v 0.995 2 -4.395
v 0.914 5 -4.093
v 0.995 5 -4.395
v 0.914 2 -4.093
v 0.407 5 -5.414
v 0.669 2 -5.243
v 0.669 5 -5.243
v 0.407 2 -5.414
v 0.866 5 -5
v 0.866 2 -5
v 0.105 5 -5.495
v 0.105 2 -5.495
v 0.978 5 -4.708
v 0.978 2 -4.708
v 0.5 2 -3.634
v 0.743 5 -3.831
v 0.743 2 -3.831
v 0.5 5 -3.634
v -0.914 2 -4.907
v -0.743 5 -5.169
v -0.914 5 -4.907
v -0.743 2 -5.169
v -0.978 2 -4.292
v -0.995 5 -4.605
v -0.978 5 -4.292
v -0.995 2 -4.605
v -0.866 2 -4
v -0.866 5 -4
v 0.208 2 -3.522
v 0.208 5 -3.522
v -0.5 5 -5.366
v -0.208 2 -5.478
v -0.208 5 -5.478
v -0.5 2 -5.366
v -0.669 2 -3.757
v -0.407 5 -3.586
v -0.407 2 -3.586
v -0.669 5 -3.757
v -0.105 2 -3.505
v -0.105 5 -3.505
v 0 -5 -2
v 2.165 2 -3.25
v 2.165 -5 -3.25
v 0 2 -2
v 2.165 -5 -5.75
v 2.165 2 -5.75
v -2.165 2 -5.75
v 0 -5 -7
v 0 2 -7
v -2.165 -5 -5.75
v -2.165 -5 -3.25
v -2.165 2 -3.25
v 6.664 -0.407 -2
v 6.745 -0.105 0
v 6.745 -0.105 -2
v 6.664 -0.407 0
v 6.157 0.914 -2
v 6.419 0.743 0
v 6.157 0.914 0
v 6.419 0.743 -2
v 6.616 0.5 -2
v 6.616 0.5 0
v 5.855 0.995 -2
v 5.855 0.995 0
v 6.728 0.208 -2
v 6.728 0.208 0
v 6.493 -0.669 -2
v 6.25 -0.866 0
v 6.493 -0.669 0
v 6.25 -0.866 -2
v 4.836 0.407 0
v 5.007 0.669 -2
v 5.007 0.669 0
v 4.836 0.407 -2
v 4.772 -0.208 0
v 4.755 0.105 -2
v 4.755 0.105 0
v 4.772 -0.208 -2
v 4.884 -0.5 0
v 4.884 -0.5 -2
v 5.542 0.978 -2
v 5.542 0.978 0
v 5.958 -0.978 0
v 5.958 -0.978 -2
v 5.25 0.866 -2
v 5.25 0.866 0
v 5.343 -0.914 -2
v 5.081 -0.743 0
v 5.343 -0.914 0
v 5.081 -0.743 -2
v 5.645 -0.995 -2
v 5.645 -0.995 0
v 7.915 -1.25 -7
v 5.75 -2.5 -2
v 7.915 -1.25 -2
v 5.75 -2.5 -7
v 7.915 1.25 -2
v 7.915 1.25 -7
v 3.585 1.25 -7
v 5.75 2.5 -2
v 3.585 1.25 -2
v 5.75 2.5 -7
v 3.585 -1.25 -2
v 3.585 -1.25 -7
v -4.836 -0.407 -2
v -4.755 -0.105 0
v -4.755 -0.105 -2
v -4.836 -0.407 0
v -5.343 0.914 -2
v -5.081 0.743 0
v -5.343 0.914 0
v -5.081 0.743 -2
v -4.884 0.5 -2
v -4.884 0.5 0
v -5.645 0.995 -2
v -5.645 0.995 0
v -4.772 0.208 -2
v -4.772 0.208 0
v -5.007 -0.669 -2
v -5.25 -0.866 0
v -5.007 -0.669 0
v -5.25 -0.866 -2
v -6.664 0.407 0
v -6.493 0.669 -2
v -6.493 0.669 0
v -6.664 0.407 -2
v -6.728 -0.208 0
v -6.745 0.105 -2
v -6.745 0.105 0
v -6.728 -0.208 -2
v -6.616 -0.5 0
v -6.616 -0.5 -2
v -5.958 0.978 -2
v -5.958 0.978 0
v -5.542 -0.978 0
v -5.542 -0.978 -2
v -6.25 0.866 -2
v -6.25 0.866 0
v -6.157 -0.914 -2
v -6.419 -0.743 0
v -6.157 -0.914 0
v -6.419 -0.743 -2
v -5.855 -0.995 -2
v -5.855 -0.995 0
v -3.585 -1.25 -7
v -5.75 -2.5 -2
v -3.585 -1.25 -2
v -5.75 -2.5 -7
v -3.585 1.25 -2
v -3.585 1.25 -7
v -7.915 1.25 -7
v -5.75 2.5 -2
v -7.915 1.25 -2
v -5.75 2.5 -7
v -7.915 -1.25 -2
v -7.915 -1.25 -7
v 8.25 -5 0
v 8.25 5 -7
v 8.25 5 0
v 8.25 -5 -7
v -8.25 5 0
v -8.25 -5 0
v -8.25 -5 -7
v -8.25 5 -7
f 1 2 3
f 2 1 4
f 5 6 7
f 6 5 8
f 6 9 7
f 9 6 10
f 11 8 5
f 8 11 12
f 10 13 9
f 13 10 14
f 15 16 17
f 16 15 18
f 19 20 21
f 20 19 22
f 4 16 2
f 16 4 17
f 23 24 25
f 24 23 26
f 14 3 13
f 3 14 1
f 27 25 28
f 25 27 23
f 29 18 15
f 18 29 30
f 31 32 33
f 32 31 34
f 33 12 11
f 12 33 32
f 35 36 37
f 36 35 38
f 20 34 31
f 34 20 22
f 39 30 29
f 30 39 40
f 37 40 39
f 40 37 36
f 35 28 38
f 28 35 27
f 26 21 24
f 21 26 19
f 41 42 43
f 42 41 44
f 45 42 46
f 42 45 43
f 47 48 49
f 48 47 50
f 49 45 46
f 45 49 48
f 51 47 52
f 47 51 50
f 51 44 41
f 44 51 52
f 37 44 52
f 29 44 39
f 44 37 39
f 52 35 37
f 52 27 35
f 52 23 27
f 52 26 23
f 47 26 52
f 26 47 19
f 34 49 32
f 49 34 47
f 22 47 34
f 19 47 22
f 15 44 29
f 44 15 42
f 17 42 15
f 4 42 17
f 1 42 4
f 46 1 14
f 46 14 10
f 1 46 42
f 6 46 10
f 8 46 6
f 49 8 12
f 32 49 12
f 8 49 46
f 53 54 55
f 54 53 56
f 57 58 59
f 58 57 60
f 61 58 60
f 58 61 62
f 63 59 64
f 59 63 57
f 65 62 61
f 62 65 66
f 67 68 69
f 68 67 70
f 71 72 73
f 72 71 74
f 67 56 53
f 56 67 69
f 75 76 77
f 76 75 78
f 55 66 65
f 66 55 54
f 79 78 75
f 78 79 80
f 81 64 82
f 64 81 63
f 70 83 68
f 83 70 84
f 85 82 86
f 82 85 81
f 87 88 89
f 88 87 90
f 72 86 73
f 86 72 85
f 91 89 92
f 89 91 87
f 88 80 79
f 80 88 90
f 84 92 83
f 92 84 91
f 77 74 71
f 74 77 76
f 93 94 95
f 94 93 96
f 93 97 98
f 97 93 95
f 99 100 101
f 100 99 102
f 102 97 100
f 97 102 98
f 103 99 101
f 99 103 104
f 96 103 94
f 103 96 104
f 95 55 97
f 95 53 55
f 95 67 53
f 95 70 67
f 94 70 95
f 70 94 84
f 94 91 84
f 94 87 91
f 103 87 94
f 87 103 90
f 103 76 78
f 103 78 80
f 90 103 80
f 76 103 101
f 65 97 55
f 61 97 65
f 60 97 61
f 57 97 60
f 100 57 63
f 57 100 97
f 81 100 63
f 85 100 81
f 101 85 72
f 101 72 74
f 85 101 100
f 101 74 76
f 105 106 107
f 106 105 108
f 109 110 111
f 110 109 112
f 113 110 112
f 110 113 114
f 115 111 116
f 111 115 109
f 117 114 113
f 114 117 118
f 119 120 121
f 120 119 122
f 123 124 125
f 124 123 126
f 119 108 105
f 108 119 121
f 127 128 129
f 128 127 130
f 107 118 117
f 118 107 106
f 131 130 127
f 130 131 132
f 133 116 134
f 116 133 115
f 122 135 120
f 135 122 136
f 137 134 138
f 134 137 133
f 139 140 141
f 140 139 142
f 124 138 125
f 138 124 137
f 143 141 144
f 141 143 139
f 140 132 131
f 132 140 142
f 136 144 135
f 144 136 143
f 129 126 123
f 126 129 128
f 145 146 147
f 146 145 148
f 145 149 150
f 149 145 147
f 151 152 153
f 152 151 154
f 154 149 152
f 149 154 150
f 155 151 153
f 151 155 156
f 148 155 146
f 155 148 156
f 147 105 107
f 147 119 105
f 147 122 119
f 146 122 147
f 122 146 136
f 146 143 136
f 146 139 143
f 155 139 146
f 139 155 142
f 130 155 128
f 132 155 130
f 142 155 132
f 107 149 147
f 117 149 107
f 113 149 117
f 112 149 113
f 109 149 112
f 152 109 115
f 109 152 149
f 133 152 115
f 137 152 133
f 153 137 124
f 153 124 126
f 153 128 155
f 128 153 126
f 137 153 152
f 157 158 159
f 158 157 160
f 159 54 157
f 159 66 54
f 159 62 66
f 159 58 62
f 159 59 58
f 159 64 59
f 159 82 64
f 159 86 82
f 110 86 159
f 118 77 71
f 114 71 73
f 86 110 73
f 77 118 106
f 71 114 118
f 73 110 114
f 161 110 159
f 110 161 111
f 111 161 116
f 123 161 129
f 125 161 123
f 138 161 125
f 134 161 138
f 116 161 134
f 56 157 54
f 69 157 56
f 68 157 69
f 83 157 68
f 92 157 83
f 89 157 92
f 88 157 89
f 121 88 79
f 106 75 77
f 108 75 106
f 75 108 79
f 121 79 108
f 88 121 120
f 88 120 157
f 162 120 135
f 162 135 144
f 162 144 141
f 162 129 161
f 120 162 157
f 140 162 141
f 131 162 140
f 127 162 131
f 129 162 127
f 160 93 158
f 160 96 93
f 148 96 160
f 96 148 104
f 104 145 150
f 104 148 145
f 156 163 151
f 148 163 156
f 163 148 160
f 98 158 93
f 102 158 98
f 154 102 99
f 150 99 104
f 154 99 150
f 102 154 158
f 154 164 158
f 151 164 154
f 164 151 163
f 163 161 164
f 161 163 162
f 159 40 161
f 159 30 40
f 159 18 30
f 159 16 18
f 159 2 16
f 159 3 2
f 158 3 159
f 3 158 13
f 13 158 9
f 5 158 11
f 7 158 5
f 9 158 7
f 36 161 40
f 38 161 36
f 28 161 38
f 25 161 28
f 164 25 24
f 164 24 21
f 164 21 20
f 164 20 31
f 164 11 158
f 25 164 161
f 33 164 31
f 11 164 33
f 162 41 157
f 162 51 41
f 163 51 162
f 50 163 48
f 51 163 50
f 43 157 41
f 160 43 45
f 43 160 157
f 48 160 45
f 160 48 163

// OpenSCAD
$fn=20;

screw_m2_diameter = 2;
//screw_m2_height = 5;
screw_m2_head_diameter = 4;
screw_m2_head_height = 2;
screw_m2_nut_diameter = 5;
screw_m2_nut_height = 10;

//screw_m3_diameter = 3;
//screw_m3_height = 30;
//screw_m3_head_diameter = 6;
//screw_m3_head_height = 10;
//screw_m3_nut_diameter = 6.55;
//screw_m3_nut_height = 10;

screw_m3_diameter = screw_m2_diameter;
screw_m3_height = 30;
screw_m3_head_diameter = screw_m2_head_diameter;
screw_m3_head_height = 10;
screw_m3_nut_diameter = screw_m2_nut_diameter;
screw_m3_nut_height = 10;

// the minium material arougd screw
screw_material_thickness = 2;
screw_material_thickness_stronger = 3;

belt_width = 6.5;
belt_step_space = 2;

// space between parts
base_space = 2;

// computed

screw_m2_height = base_space + (screw_material_thickness * 2);

base_x = belt_width + (screw_m2_nut_diameter * 2);
base_y = 10;
base_bottom_z = screw_m3_nut_diameter + screw_material_thickness;
base_top_z = screw_material_thickness + screw_m2_head_height;
	
belt_step_radius = belt_step_space / 4;

echo("base_x", base_x);
echo("base_y", base_y);
echo("base_bottom_z", base_bottom_z);
echo("base_top_z", base_top_z);
echo("total_z", base_bottom_z + base_top_z + 1);

module screw(
	screw_diameter, screw_height,
	screw_head_diameter, screw_head_height,
	screw_nut_diameter, screw_nut_height
) {
	color([0.2, 0.2, 0.2])
	union() {
		translate([0, 0, (screw_height / 2) + (screw_head_height / 2)])
		cylinder(r=(screw_head_diameter / 2), h=screw_head_height , center=true);
		
		cylinder(r=(screw_diameter / 2), h=(screw_height + 0.1) , center=true);
		
		translate([0, 0, -(screw_height / 2) - (screw_nut_height / 2)])
		cylinder(r=(screw_nut_diameter / 2), h=screw_nut_height, $fn=6 , center=true);
	}
}
//screw

module screw_m2() {
	screw(
		screw_m2_diameter, screw_m2_height,
		screw_m2_head_diameter, screw_m2_head_height + 0.01,
		screw_m2_nut_diameter, screw_m2_nut_height
	);
}
//screw_m2

module screw_m3() {
	screw(
		screw_m3_diameter, screw_m3_height,
		screw_m3_head_diameter, screw_m3_head_height,
		screw_m3_nut_diameter, screw_m3_nut_height
	);
}
//screw_m3

module positioned_screw_m2(pos_x) {
	translate([((belt_width / 2) + (screw_m2_nut_diameter / 2)) * pos_x, 0, (base_space / 2)])
	rotate([0, 0, 30])
	screw_m2();
}
// positioned_screw_m2

module positioned_screw_m3() {
	positioned_screw_m3_offset_z = -(screw_m3_nut_diameter / 2) - screw_material_thickness;
	
	translate([0, (screw_m3_height / 2) + (base_y / 2) - screw_material_thickness_stronger, -(screw_m3_nut_diameter / 2) - screw_material_thickness])
	rotate([-90, 30, 0])
	screw_m3();
	echo("positioned_screw_m3_offset_z", positioned_screw_m3_offset_z);
}
// positioned_screw_m3

module belt_step() {
	rotate([0, 90, 0])
	cylinder(r=belt_step_radius, h=belt_width , center=true);
}
//belt_step

module positioned_belt_step() {
	belt_step_offset = -(base_y / 2) + belt_step_radius;
	
	i = 0;
	end = belt_step_offset + base_y - belt_step_radius;
	for(pos_y = [belt_step_offset : belt_step_space : end]) {
		translate([0, pos_y, 0])
		belt_step();
	}
}
// positioned_belt_step

module base_bottom() {
	translate([0, 0, -(base_bottom_z / 2)])
	cube([base_x, base_y, base_bottom_z], center = true);
}
//base_bottom

module base_top() {
	color([1, 1, 0, 0.7])
	translate([0, 0, (base_top_z / 2) + base_space])
	cube([base_x, base_y, base_top_z], center = true);
}
//base_top

module _render_bottom() {
	color([1, 1, 0, 0.7])
	difference() {
		union() {
			base_bottom();
//			positioned_belt_step();
		}
		
		union() {
			positioned_screw_m3();
			positioned_screw_m2(1);
			positioned_screw_m2(-1);
		}
	}
}
// _render_bottom

module _render_top() {
	color([1, 1, 0, 0.7])
	difference() {
		union() {
			base_top();
			translate([0, 0, 2])
			positioned_belt_step();
		}
		
		union() {
			positioned_screw_m2(1);
			positioned_screw_m2(-1);
		}
	}
}
// _render_top

//_render_top();
_render_bottom();
